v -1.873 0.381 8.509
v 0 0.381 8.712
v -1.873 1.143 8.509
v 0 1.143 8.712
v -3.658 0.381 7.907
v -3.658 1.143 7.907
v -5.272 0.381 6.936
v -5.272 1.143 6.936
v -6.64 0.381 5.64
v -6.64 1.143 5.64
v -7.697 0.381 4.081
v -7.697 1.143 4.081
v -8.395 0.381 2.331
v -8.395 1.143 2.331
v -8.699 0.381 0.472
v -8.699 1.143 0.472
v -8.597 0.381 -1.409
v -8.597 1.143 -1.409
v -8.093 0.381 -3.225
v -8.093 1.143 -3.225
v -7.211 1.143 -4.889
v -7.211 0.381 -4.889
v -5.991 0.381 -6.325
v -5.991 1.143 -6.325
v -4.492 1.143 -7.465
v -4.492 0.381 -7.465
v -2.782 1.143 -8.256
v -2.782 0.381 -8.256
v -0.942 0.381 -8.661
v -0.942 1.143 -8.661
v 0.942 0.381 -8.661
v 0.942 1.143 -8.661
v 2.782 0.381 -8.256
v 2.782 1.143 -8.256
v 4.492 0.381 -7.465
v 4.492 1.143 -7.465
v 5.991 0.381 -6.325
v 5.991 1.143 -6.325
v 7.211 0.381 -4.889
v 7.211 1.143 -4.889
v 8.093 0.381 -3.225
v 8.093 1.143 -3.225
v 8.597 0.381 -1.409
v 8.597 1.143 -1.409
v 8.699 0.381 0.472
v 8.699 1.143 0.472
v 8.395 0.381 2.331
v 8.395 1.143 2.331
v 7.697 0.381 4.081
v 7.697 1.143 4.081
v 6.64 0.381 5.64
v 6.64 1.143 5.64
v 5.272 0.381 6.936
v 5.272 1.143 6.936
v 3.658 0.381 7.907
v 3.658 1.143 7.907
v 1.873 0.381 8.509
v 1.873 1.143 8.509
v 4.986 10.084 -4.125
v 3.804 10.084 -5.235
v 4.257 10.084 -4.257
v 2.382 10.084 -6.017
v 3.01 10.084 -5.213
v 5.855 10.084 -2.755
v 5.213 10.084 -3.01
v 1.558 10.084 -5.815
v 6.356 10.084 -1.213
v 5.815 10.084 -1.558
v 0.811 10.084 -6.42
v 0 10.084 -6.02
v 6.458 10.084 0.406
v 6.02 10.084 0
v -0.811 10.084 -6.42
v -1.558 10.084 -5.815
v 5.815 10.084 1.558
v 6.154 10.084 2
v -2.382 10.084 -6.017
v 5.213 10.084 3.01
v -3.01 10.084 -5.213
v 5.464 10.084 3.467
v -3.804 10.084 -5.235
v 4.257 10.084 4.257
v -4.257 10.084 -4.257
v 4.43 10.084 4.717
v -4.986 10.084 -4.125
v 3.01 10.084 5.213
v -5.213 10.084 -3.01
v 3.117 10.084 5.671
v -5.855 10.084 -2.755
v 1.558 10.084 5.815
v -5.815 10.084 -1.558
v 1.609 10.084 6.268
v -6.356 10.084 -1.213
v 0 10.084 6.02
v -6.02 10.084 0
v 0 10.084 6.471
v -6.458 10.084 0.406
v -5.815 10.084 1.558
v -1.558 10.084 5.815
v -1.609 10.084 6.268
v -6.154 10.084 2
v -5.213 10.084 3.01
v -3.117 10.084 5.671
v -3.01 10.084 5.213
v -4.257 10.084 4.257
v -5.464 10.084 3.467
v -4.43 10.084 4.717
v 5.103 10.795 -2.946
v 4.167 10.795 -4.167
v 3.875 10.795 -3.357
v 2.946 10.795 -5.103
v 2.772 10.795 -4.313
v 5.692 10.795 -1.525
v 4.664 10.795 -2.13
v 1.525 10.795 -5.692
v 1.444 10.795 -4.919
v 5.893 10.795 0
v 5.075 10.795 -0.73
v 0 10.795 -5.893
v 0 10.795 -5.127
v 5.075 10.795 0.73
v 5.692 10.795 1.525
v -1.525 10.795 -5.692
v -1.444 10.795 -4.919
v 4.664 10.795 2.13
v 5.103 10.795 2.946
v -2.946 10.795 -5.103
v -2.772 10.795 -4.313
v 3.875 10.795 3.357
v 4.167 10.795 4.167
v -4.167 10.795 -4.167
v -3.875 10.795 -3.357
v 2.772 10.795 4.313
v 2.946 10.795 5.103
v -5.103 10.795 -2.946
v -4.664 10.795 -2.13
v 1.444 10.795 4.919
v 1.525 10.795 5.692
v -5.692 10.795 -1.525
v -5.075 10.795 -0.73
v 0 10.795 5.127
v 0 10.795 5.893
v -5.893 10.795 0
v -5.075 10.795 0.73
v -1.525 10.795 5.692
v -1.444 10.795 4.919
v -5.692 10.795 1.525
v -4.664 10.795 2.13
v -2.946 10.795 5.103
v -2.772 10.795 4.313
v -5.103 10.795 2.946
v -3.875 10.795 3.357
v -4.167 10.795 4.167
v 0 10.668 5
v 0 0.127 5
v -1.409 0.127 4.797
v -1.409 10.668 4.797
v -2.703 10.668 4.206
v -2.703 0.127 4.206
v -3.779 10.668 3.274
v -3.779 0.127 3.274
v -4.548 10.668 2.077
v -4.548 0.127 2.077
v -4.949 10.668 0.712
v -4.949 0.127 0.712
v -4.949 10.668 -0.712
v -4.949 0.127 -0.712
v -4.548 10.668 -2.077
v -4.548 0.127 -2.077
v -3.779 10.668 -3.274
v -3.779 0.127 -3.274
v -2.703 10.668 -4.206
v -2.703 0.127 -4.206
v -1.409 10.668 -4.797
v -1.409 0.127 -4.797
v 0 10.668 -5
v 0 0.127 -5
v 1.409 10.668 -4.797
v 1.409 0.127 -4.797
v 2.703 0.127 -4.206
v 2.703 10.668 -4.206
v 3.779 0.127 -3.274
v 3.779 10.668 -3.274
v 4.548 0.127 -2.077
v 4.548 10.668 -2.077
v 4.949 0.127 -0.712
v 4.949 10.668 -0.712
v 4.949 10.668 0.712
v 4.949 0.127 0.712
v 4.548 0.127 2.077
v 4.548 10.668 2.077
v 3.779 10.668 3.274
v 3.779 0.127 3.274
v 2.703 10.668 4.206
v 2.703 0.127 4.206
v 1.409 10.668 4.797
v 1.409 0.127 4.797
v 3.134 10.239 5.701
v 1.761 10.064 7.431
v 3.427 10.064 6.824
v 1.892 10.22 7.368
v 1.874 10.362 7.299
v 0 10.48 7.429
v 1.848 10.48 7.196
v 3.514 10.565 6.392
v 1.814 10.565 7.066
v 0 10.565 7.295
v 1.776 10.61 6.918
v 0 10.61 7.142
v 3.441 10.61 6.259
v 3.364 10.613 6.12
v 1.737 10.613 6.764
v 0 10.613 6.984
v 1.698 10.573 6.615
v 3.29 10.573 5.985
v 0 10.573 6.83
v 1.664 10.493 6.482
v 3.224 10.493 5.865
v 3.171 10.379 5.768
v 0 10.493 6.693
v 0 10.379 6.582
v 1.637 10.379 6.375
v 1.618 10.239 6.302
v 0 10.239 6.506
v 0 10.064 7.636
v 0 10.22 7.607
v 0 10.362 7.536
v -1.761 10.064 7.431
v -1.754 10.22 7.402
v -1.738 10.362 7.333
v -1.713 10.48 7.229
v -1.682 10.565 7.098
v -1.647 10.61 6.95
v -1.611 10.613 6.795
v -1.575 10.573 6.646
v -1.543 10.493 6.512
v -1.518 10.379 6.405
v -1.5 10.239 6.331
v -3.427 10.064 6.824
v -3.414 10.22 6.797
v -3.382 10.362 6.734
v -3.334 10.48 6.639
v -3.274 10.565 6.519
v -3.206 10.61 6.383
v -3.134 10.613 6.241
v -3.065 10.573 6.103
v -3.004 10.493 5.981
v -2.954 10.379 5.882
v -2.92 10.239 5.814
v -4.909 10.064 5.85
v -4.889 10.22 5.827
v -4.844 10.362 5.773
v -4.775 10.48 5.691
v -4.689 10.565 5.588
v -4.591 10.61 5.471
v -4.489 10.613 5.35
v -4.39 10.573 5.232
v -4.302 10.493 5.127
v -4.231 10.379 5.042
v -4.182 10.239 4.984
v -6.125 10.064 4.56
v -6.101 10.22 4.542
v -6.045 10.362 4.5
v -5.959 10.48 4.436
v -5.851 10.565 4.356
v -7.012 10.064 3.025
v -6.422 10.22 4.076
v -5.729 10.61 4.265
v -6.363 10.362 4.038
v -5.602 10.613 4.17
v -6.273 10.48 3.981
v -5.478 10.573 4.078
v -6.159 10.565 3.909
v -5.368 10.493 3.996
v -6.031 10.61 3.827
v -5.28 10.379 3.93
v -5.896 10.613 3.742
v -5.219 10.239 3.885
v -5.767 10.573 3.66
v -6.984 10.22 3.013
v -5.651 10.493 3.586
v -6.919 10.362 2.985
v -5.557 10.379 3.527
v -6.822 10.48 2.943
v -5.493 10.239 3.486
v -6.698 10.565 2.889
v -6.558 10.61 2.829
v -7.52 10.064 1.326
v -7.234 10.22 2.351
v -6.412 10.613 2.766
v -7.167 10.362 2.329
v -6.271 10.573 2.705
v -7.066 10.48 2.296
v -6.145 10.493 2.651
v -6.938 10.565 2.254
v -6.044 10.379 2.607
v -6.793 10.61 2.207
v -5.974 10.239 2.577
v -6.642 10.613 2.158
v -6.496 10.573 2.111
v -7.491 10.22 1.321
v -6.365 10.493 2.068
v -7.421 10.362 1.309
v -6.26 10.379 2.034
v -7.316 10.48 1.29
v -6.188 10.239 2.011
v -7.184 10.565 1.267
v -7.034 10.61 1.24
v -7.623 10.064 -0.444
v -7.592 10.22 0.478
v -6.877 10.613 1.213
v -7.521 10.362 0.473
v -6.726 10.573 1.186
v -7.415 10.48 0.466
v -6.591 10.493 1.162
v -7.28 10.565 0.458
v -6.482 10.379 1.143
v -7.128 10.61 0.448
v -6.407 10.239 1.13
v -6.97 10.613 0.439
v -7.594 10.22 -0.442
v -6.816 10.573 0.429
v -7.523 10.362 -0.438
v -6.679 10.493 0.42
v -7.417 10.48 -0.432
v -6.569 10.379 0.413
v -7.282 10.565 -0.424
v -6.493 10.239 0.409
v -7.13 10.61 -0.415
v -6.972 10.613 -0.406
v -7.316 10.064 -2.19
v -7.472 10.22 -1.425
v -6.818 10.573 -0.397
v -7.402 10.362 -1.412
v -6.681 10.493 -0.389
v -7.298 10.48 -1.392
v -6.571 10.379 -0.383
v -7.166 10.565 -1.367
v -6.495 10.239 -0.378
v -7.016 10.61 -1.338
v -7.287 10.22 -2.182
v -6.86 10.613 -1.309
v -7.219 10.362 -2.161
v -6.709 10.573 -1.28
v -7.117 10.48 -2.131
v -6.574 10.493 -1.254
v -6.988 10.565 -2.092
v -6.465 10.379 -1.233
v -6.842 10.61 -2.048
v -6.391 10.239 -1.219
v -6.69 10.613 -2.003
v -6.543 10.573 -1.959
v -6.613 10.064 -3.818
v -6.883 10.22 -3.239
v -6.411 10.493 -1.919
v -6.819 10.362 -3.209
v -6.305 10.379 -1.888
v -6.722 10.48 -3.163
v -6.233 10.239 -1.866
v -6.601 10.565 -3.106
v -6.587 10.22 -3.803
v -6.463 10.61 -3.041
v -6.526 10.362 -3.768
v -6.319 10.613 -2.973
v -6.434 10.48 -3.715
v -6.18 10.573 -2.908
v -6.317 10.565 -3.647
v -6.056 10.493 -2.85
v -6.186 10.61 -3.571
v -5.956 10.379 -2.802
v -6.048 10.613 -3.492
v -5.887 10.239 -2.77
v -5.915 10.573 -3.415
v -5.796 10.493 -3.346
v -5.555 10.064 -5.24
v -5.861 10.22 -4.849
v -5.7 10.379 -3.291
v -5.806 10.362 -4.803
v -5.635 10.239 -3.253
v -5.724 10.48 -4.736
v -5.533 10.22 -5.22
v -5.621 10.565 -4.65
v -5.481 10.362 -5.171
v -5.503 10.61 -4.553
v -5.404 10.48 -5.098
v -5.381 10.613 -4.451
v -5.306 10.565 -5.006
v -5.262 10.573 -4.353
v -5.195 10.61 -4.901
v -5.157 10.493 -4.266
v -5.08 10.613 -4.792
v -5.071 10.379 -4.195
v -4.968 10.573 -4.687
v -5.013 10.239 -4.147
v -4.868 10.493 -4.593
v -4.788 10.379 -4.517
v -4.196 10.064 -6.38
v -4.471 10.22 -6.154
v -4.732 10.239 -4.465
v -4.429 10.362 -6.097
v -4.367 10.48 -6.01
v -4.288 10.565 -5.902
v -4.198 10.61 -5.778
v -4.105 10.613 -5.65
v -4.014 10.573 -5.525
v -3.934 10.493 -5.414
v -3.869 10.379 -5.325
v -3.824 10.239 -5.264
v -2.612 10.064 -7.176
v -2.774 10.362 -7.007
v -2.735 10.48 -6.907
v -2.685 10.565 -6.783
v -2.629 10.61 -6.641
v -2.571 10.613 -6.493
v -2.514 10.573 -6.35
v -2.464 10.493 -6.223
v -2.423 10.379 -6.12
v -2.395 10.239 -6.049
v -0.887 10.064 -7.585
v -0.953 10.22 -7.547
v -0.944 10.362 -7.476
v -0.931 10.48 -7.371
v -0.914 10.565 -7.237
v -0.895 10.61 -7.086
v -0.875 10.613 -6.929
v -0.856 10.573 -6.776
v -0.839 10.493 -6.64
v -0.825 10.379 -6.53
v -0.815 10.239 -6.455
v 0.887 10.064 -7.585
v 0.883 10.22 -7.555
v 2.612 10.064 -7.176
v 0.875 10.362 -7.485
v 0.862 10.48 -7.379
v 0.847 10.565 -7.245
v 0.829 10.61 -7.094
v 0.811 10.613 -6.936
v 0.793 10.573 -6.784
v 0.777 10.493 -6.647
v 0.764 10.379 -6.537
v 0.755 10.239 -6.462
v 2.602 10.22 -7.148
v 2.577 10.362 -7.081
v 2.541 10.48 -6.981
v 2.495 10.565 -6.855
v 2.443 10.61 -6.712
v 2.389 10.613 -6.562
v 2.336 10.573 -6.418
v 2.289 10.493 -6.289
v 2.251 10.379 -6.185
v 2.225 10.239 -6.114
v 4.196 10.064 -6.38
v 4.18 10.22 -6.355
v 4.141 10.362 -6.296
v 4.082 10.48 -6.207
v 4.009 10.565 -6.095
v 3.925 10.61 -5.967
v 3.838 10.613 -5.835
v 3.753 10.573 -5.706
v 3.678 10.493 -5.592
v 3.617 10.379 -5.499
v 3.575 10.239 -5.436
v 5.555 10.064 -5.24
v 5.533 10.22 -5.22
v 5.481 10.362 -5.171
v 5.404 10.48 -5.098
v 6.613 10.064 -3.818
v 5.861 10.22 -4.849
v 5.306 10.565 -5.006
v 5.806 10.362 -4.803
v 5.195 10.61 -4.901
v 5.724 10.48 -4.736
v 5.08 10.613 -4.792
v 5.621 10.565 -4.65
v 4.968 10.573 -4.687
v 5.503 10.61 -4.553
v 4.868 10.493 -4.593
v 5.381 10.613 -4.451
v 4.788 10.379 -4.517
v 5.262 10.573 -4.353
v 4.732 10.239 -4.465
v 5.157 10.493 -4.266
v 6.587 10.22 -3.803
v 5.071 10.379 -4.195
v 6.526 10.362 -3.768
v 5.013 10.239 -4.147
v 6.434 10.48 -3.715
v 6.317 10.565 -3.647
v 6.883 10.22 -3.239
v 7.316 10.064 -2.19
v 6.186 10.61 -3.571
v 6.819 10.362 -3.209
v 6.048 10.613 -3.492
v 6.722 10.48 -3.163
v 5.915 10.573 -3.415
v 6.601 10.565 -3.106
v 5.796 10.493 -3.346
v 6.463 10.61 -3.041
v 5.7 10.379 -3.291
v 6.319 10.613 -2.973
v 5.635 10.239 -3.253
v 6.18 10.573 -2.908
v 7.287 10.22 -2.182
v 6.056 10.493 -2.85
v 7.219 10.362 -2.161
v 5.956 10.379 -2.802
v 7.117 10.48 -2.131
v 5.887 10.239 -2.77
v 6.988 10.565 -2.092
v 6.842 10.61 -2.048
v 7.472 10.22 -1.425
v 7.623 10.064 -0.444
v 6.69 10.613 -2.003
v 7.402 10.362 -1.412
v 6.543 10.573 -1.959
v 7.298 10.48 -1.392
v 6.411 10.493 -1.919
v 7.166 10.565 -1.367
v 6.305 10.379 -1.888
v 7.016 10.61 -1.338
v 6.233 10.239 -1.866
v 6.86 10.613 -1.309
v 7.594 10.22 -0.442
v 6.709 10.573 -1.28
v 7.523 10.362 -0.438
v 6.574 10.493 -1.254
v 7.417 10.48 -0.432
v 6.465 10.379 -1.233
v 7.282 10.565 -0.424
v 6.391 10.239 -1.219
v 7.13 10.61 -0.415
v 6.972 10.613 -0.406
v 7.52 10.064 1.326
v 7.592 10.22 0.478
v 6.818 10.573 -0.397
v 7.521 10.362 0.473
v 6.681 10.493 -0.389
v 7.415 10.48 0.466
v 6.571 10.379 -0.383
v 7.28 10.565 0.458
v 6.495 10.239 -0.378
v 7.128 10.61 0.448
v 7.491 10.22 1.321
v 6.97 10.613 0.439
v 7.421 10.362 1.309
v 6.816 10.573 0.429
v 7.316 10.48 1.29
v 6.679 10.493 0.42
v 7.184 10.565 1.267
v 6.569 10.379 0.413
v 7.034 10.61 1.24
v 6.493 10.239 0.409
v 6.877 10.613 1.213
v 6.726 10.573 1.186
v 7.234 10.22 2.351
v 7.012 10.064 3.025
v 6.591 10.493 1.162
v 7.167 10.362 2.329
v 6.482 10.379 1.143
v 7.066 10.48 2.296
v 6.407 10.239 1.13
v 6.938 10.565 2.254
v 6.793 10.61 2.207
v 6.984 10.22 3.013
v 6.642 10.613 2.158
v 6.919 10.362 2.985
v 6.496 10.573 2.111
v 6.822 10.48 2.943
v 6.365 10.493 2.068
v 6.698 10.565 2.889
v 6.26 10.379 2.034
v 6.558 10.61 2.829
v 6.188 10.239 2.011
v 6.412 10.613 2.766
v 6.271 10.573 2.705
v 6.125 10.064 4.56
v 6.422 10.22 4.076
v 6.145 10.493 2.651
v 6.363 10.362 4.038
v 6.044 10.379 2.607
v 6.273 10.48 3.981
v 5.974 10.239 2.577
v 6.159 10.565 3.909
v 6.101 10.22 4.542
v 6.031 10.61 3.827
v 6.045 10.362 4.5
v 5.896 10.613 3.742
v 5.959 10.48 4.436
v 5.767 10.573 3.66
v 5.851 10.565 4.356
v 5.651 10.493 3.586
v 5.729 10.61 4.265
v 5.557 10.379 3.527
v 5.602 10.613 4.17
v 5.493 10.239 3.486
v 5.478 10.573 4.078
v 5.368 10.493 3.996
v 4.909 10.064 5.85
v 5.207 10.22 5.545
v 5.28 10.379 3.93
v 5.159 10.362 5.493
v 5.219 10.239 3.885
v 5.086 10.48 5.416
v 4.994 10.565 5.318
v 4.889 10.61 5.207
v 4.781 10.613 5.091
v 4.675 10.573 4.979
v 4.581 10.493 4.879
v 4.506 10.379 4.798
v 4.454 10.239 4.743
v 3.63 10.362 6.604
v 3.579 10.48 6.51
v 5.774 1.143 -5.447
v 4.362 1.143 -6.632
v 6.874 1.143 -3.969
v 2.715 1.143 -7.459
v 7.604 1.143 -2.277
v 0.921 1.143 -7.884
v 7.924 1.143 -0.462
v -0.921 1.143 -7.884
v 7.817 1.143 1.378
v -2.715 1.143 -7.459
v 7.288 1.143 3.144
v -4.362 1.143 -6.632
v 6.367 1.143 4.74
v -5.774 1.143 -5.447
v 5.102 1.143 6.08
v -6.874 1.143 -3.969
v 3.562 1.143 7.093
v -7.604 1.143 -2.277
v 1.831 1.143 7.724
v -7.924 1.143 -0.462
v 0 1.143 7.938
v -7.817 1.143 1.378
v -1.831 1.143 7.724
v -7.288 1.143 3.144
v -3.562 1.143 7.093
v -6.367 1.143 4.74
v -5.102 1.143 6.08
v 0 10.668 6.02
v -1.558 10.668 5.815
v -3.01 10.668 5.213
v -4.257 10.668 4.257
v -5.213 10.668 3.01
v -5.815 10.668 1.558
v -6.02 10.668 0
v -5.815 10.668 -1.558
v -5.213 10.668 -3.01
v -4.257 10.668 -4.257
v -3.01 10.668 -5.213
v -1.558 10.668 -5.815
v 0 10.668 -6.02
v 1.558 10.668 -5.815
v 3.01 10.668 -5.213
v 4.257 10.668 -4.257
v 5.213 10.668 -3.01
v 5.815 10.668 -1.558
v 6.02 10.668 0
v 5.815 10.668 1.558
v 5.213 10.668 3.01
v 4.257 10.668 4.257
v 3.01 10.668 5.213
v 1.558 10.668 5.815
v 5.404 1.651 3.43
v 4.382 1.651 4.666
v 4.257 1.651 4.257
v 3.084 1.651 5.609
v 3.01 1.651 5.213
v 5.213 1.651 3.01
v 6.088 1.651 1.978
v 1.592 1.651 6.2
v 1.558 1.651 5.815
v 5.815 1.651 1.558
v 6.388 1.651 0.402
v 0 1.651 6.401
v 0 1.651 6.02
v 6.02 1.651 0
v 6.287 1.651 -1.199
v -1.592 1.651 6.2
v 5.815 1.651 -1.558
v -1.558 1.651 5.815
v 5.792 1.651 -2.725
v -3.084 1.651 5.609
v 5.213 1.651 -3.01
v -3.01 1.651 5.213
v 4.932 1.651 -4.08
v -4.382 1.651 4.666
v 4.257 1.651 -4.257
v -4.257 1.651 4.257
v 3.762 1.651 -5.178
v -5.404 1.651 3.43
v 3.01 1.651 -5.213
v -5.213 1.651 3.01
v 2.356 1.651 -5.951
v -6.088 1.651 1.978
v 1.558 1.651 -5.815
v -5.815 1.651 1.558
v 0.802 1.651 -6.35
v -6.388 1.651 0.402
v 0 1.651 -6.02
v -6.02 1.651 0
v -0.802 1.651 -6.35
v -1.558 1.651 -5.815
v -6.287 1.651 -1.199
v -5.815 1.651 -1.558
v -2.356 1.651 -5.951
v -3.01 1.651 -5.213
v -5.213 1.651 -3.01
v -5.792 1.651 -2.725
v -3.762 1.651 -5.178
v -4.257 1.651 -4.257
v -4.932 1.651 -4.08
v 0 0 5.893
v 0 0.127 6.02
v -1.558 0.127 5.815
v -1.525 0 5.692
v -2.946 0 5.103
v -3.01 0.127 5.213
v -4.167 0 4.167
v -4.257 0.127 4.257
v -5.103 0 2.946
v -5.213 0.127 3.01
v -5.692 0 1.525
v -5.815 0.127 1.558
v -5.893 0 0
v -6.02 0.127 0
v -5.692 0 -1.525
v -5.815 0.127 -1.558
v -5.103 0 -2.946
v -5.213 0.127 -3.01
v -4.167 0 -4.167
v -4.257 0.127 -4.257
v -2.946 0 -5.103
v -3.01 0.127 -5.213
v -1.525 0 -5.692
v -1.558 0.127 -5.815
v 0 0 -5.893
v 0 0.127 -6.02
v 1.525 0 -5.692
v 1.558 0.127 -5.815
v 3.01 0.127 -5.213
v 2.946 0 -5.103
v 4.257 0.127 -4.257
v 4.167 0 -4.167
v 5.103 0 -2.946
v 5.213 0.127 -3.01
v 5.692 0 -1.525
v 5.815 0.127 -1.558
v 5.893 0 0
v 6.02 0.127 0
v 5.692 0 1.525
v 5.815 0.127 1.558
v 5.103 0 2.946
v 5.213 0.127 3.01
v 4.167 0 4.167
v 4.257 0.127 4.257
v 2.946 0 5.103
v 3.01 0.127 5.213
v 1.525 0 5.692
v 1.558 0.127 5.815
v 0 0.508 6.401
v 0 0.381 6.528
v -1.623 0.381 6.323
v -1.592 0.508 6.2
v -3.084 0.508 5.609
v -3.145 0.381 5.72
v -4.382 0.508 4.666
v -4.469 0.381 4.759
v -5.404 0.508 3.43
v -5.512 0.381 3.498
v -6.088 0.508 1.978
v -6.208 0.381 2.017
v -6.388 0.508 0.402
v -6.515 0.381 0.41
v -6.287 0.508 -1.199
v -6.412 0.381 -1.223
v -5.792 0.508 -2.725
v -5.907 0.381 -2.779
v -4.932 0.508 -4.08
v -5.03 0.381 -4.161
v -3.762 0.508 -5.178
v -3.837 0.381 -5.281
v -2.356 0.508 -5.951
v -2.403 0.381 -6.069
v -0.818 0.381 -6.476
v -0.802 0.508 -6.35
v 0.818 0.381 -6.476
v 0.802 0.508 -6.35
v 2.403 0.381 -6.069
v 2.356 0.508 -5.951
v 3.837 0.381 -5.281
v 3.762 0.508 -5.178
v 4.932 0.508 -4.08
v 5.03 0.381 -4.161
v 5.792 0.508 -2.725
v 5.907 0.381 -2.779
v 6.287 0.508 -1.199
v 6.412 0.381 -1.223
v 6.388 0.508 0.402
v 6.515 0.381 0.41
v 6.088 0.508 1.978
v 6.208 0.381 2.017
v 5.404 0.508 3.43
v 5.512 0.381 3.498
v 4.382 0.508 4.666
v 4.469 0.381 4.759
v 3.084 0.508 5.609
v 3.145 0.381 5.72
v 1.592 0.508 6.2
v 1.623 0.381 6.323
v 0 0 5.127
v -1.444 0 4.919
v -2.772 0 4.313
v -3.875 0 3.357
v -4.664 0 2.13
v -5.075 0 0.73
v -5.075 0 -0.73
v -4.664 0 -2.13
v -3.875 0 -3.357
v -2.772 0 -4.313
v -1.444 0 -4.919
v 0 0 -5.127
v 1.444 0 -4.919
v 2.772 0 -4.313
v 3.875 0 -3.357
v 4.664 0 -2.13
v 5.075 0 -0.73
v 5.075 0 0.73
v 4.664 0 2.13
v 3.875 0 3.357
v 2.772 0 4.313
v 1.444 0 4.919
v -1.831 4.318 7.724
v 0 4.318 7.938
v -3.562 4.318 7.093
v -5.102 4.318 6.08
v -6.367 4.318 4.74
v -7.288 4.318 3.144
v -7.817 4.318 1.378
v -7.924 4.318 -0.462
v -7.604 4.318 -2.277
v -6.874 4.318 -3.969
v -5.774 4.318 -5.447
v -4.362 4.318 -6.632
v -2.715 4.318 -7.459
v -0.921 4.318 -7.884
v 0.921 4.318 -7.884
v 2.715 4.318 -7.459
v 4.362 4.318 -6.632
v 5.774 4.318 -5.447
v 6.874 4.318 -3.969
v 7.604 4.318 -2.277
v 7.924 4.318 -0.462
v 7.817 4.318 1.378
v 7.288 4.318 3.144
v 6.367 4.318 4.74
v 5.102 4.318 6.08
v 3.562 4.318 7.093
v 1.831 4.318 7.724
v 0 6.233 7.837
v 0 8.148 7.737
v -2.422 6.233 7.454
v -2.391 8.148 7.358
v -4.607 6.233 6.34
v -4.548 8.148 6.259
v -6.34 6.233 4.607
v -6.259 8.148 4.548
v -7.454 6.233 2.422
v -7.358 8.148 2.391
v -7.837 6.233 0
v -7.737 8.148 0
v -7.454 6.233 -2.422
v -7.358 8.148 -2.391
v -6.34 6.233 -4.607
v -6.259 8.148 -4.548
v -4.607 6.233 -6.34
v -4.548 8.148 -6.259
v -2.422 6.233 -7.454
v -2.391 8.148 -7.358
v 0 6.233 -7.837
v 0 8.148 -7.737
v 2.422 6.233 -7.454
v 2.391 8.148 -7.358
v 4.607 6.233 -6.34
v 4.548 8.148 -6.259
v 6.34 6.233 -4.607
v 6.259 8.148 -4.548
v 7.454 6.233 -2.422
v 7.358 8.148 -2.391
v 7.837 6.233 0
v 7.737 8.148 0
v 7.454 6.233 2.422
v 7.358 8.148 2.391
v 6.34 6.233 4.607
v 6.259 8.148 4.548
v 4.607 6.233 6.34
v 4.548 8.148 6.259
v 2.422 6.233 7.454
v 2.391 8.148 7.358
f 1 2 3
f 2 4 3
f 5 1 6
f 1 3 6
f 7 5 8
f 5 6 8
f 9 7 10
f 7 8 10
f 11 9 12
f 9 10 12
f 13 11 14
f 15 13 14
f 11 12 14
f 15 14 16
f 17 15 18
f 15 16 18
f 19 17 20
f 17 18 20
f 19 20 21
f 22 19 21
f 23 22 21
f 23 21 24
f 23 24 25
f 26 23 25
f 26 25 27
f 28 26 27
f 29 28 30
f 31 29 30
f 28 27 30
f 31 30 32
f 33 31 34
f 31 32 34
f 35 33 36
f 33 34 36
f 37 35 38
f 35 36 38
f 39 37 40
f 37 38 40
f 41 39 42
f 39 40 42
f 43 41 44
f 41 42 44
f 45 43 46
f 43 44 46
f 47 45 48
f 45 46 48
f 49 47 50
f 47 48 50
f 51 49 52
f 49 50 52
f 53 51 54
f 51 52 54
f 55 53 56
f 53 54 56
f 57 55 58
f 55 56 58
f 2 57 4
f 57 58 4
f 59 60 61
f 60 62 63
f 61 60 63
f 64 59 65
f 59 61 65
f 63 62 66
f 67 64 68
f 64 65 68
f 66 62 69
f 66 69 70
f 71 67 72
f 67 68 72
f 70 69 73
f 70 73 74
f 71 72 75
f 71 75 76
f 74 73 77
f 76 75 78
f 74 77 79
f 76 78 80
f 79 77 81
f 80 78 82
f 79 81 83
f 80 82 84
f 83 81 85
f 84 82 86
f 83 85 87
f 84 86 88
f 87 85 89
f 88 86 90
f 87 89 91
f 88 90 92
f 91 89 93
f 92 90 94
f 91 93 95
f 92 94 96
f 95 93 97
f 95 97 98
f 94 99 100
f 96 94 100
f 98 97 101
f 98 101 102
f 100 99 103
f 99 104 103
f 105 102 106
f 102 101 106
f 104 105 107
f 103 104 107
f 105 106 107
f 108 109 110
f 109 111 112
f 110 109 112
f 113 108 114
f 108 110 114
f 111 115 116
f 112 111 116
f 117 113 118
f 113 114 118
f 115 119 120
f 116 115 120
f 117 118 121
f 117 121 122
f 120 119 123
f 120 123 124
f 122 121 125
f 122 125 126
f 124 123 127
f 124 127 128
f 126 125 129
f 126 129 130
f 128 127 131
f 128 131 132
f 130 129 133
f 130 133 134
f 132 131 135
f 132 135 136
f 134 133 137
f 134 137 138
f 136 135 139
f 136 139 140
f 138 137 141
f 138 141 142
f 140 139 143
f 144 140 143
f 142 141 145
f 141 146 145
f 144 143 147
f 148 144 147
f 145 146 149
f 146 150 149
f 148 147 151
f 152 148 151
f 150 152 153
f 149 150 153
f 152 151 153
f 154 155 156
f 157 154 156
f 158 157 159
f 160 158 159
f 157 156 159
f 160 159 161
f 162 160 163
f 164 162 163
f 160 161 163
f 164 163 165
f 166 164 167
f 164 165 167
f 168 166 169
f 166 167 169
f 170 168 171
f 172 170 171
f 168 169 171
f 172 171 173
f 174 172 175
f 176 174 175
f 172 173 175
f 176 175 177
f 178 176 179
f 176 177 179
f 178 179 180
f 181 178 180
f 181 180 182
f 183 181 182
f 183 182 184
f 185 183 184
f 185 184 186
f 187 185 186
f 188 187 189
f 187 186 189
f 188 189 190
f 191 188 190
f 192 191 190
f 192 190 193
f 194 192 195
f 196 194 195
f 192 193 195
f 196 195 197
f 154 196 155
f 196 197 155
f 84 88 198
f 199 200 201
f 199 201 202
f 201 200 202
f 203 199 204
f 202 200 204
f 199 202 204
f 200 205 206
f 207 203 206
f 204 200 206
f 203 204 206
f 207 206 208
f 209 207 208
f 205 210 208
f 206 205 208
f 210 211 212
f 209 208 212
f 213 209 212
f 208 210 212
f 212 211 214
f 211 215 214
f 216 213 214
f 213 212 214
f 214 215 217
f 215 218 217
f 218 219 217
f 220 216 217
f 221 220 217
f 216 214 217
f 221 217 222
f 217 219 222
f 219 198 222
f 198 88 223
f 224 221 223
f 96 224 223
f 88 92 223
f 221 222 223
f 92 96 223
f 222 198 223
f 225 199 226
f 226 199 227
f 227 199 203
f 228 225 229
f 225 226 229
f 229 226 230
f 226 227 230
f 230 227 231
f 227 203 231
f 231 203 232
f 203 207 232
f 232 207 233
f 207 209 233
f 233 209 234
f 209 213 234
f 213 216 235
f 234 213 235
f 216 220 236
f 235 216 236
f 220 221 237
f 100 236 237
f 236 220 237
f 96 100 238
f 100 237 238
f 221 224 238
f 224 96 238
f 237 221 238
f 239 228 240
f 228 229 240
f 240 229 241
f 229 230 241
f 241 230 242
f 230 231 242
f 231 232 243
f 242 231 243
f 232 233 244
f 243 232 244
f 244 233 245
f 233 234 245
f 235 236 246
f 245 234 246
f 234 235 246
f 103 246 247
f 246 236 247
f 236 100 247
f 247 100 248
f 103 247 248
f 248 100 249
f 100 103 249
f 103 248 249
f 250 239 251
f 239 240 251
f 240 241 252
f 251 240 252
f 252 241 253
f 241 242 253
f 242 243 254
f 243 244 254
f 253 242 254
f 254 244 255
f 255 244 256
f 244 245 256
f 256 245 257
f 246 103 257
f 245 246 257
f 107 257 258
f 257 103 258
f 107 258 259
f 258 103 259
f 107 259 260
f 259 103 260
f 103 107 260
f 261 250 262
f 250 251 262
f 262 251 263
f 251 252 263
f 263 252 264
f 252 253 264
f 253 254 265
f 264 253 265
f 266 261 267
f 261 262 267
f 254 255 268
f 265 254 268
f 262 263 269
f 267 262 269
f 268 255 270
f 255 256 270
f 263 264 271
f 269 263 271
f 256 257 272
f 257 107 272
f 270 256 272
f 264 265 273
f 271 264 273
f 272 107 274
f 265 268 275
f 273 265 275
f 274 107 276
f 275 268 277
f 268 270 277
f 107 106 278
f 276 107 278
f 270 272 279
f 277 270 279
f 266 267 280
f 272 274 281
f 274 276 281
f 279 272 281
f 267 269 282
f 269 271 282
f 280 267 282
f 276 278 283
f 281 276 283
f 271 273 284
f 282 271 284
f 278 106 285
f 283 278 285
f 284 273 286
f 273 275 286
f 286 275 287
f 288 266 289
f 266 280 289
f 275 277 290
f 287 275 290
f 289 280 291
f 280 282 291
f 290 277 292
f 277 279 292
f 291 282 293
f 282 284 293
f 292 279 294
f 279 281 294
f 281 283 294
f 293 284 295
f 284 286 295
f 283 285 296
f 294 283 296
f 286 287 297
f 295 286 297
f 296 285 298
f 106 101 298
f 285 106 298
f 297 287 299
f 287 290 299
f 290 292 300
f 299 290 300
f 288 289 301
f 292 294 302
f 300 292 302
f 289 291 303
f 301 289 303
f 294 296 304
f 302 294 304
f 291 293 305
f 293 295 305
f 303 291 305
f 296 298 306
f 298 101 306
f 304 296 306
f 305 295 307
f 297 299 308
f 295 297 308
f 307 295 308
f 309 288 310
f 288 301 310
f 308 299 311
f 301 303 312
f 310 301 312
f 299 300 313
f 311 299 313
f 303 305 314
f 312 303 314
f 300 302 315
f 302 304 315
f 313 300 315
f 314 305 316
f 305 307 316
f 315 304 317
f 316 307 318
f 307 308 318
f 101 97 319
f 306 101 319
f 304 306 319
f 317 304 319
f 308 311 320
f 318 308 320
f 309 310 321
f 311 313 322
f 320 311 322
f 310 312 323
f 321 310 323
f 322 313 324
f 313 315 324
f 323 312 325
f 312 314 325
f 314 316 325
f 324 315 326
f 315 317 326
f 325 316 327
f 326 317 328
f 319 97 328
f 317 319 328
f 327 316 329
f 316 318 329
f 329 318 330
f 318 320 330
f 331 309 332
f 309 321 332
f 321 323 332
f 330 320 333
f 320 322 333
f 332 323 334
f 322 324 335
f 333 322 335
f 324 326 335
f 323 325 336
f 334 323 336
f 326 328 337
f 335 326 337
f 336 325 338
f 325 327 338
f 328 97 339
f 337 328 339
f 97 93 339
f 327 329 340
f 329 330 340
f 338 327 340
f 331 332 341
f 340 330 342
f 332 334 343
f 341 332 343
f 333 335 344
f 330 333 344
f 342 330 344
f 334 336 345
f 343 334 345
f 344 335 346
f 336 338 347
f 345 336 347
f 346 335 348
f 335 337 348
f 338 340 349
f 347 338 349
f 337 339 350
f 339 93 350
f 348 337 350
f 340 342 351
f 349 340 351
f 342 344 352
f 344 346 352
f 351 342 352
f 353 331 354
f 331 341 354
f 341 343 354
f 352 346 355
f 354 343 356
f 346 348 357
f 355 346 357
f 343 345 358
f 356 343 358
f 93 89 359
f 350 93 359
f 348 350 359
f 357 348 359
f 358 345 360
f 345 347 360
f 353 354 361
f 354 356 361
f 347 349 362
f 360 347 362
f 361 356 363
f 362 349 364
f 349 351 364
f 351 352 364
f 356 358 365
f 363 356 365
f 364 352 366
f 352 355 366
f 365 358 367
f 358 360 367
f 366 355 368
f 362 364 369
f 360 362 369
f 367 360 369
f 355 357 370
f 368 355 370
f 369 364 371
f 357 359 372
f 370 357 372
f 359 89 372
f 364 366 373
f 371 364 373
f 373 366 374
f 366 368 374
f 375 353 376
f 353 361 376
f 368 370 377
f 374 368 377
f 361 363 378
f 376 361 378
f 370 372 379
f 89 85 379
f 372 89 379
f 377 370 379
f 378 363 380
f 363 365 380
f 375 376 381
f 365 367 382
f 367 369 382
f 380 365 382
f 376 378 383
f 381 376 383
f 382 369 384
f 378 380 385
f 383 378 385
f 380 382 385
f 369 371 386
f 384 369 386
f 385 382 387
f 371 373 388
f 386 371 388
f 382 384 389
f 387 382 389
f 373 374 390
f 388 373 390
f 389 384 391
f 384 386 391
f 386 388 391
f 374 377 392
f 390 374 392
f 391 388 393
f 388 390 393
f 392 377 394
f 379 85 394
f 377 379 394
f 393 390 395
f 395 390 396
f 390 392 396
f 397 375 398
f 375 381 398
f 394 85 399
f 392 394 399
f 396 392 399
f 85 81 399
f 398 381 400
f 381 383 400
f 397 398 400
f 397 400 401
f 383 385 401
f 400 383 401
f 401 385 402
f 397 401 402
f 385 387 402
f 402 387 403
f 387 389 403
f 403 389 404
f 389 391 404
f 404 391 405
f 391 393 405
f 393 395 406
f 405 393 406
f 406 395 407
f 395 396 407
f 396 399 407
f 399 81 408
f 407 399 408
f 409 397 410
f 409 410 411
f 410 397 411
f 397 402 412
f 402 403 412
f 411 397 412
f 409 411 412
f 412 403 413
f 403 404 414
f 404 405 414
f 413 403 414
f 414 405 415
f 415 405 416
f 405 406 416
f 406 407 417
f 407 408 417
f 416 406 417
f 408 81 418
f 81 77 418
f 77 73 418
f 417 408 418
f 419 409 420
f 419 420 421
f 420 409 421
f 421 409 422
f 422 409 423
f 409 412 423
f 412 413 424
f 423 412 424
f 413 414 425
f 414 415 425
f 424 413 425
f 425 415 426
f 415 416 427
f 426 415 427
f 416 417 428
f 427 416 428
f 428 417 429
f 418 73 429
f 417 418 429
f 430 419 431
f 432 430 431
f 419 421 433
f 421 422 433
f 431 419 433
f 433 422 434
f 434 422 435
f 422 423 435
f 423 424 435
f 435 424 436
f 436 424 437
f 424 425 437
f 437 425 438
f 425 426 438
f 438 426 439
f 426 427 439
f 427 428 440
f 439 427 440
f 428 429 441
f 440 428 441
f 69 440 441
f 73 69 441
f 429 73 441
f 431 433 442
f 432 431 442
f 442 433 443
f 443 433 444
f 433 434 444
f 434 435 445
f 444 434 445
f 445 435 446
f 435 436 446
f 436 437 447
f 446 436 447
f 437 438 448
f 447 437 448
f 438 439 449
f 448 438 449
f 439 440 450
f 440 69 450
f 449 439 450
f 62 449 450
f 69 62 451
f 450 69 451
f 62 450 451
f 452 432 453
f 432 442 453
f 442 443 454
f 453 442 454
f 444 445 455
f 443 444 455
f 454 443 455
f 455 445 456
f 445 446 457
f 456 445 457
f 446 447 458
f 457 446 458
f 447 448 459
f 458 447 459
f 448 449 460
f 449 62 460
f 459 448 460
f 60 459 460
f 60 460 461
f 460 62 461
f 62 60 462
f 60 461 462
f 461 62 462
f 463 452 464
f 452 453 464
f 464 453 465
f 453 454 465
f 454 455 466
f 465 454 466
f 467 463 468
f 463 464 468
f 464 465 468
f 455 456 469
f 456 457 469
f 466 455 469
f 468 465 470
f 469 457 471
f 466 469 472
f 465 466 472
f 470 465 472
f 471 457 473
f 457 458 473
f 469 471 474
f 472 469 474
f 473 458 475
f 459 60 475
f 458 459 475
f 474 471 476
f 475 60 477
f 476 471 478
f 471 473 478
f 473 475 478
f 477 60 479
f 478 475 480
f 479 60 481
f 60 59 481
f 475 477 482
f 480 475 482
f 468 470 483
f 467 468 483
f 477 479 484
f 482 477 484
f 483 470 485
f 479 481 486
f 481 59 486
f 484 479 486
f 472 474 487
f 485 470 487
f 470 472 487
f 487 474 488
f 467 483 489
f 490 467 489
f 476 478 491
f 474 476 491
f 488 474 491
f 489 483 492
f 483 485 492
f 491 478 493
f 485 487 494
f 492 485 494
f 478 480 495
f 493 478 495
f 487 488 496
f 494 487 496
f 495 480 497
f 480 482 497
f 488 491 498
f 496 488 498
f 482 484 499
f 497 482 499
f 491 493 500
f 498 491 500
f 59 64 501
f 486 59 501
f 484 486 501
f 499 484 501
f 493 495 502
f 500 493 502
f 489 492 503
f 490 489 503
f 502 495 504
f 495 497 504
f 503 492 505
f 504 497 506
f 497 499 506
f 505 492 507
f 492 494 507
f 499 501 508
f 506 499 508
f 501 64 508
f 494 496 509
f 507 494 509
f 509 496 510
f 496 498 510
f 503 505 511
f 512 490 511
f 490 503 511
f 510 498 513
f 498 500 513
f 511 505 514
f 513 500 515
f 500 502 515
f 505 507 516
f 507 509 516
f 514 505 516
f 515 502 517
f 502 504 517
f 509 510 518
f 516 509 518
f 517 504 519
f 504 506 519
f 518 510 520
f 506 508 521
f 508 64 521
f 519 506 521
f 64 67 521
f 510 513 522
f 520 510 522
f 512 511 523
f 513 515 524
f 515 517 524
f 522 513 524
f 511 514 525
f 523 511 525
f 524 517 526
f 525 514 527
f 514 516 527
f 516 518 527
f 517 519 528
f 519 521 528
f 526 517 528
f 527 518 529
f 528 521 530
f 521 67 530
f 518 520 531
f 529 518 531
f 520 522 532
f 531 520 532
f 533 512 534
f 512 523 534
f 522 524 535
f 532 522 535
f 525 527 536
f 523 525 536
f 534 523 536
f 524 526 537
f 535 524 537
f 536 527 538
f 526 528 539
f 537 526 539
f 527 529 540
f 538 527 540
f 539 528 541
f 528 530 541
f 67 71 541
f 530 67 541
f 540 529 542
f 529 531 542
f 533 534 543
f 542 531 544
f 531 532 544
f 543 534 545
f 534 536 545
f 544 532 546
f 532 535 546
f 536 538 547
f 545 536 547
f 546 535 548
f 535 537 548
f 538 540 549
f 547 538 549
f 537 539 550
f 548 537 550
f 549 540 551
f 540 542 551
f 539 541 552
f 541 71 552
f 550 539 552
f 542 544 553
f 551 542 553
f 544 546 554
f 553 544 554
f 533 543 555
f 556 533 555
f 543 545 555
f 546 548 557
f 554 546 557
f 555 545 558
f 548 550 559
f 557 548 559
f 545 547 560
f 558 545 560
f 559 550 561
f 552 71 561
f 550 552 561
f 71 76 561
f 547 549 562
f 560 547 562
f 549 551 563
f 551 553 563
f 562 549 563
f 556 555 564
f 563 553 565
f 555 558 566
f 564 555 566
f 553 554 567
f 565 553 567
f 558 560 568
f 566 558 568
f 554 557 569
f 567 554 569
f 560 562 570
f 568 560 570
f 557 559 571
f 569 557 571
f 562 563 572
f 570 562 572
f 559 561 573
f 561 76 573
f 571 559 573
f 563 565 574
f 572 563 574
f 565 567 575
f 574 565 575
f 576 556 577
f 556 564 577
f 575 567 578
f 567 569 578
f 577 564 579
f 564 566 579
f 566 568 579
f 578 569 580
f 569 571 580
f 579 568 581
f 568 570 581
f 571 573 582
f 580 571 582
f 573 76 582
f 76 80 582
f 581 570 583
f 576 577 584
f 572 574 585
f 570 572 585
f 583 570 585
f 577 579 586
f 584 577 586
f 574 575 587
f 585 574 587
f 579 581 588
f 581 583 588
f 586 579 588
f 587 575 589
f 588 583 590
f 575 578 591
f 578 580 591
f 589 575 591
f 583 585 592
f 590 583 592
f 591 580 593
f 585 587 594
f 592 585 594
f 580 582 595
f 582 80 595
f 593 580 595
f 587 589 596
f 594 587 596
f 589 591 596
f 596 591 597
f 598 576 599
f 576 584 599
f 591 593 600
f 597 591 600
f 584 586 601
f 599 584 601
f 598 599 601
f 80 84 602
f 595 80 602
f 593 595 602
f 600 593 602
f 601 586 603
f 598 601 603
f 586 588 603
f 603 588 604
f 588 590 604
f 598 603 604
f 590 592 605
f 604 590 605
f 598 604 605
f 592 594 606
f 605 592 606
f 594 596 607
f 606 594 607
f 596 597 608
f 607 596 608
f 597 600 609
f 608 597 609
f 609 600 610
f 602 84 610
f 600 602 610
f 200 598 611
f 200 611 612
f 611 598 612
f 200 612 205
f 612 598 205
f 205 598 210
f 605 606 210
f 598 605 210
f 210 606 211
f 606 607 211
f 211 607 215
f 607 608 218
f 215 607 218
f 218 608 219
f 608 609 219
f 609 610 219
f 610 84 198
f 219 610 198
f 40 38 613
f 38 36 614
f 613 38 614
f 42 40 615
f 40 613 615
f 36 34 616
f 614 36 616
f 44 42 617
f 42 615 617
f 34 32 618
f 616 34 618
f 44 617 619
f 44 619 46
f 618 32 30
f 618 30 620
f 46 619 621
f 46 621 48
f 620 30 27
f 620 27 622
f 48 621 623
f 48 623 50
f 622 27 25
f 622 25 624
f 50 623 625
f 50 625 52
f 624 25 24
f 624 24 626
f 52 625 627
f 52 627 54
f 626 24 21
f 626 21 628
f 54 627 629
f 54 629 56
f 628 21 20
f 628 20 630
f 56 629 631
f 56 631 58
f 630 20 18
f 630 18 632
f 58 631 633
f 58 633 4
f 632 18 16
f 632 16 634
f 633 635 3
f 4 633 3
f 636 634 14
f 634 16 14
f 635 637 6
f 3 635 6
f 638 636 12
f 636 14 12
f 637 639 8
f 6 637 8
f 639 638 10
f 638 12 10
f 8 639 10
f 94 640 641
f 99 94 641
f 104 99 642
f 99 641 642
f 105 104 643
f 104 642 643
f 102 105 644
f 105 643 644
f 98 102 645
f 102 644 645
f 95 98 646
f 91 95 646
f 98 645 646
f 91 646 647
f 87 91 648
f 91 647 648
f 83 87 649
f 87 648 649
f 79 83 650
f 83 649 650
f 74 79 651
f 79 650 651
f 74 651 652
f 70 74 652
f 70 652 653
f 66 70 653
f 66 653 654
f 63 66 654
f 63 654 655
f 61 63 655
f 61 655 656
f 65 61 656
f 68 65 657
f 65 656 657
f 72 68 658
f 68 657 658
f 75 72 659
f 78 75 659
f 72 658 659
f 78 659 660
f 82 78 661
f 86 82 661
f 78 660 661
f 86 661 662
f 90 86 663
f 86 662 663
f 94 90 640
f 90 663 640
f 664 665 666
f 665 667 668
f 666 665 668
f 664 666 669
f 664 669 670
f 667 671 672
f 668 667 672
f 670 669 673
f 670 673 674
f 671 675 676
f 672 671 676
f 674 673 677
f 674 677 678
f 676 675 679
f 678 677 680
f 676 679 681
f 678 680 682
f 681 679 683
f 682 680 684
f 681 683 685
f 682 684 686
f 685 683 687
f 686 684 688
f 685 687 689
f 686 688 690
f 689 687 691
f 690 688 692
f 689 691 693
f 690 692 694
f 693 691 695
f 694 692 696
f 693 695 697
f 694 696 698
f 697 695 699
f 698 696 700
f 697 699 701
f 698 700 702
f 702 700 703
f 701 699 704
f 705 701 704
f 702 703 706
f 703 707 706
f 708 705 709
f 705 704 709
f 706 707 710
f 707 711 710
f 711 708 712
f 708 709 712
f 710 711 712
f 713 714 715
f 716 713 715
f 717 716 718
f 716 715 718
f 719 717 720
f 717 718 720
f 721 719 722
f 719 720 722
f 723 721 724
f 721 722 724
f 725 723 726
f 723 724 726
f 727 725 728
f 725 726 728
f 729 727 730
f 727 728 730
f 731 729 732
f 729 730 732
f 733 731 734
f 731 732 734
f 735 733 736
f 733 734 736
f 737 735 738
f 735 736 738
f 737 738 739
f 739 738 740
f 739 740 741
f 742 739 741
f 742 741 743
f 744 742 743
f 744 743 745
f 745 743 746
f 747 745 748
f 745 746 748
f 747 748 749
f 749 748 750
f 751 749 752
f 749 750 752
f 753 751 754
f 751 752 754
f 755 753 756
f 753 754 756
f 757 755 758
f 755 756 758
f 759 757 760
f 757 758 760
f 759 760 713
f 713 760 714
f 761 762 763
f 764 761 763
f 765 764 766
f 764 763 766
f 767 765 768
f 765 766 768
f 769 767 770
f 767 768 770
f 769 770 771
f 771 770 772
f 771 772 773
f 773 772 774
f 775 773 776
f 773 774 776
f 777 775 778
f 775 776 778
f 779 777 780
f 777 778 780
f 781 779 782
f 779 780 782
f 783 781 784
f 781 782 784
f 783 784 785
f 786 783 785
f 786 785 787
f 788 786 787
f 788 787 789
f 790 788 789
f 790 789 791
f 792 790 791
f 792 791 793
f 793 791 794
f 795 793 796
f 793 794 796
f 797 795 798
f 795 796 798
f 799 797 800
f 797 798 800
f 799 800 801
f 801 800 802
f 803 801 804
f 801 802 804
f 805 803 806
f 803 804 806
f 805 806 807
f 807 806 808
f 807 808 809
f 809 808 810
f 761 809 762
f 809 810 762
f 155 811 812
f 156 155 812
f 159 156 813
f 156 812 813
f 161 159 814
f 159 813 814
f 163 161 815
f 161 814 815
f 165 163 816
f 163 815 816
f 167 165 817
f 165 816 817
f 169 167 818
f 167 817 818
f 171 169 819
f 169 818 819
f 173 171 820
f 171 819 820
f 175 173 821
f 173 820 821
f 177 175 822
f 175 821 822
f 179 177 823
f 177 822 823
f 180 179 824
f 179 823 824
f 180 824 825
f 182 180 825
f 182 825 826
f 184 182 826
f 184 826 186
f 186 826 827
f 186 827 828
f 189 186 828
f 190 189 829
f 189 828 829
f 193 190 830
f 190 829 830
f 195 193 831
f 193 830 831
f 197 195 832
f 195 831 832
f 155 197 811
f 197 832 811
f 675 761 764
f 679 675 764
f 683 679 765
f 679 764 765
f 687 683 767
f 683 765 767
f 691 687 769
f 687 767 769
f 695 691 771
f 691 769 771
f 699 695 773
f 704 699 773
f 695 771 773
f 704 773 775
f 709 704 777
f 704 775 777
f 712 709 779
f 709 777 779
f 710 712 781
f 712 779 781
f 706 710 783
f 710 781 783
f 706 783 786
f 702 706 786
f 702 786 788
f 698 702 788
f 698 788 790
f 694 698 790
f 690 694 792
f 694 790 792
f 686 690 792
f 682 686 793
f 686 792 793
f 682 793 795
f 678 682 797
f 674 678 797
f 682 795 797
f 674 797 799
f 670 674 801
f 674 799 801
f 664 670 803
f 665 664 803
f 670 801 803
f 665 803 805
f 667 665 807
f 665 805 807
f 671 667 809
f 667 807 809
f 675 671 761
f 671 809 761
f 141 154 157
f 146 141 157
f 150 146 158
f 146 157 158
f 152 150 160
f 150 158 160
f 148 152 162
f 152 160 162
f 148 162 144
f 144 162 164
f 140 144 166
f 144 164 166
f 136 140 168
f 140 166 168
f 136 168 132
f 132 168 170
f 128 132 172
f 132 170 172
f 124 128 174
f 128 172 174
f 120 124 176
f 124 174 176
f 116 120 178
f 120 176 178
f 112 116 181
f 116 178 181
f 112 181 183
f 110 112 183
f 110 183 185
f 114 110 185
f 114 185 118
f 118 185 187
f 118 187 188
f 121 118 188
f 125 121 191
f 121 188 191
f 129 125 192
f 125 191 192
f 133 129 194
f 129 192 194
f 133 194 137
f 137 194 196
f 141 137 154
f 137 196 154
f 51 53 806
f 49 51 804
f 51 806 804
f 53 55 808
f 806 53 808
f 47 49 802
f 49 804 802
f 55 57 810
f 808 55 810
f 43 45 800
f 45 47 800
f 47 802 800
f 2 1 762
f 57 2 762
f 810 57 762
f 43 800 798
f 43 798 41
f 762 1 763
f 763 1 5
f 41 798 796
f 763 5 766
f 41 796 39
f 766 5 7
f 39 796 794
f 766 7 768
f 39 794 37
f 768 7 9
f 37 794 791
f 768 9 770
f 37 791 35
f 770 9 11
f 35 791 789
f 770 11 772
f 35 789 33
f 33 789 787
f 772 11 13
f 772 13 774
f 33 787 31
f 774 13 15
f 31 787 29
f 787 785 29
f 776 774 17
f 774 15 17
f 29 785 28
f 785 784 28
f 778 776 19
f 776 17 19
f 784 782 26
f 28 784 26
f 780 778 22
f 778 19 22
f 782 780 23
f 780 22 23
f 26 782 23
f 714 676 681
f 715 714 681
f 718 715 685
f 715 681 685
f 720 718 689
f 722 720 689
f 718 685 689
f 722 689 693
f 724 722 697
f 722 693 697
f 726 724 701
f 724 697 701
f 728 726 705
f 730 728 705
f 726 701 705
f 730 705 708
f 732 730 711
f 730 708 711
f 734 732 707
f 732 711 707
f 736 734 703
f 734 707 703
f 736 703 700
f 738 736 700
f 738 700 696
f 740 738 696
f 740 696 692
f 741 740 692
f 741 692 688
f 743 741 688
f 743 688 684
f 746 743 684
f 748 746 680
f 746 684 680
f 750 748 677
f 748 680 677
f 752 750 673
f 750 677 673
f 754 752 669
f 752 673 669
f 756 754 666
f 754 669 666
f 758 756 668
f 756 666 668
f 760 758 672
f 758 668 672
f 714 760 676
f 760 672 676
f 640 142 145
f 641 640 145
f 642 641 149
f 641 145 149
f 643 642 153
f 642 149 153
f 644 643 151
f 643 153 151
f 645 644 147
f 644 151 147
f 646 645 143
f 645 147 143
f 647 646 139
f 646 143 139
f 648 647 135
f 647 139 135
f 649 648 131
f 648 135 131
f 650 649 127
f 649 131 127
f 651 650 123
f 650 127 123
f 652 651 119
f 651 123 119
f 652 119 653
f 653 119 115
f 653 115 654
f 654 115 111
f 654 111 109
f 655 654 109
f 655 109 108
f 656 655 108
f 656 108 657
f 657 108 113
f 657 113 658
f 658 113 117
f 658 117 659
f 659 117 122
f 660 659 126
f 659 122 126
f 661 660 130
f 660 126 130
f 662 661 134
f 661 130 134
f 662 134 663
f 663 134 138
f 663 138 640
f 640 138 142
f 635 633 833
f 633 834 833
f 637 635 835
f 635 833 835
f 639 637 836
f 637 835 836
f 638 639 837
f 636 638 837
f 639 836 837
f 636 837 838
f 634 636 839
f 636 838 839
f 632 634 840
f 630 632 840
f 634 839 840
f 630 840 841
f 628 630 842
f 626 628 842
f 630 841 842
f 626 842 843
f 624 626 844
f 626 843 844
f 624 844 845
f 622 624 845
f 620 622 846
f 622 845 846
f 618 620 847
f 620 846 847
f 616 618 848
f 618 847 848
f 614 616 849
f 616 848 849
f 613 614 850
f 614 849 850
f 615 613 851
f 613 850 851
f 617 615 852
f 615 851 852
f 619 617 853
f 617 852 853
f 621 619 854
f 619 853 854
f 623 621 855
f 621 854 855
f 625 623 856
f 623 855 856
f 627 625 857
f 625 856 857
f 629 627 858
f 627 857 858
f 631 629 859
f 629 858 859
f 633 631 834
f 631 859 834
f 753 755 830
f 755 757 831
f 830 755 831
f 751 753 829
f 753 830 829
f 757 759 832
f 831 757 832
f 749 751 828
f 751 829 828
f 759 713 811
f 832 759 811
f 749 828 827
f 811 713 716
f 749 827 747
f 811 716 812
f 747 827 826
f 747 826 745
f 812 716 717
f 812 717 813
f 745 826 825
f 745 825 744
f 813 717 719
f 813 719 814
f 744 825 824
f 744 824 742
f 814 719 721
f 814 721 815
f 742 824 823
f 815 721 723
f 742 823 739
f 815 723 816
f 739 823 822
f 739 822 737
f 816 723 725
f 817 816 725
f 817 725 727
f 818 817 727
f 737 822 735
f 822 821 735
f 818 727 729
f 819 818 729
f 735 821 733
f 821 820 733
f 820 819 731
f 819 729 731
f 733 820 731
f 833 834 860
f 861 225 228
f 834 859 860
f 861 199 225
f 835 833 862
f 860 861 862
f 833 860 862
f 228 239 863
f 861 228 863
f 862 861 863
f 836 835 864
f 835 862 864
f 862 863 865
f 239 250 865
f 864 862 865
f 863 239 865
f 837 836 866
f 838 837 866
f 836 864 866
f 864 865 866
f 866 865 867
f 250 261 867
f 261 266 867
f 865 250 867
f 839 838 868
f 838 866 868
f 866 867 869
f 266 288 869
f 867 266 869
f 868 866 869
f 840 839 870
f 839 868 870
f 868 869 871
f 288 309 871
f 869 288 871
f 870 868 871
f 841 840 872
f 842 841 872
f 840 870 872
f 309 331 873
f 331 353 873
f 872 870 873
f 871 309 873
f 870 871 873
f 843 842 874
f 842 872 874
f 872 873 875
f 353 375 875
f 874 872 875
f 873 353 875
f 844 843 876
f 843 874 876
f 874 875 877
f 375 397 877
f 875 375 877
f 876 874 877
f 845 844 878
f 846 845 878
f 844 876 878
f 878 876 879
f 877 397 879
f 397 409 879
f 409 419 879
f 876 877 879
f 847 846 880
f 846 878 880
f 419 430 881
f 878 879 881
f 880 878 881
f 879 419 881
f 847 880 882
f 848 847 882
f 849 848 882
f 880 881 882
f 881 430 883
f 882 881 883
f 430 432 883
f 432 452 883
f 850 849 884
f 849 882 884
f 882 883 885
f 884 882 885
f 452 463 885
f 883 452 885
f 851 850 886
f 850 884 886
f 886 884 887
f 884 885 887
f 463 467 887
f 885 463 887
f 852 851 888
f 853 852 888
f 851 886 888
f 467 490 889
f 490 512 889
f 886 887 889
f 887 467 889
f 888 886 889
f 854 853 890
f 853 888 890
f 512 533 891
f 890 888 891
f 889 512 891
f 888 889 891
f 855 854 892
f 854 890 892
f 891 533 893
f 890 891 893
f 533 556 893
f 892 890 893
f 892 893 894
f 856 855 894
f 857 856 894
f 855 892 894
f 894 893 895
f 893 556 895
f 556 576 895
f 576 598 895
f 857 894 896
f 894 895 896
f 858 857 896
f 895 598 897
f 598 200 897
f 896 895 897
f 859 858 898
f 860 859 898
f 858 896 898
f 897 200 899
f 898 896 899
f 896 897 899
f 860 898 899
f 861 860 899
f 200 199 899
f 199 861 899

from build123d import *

# Parameters (mm, degrees)
CHAMFER1_SIZE = 0.127


with BuildPart() as part:
    # Sketch1 → Revolve1 (revolve)
    with BuildSketch(Plane.XY, mode=Mode.PRIVATE) as revolve1_sk:
        with BuildLine():
            Line((-8.7122, 0.381), (-8.7122, 1.143))
            Line((-8.7122, 1.143), (-7.9375, 1.143))
            Line((-7.9375, 1.143), (-7.9375, 4.318))
            Line((-7.9375, 4.318), (-7.636387191, 10.063574666))
            ThreePointArc((-7.636387191, 10.063574666), (-7.063125107, 10.61711204), (-6.471000704, 10.0838))
            Line((-6.471000704, 10.0838), (-6.0198, 10.0838))
            Line((-6.0198, 10.0838), (-6.0198, 10.795))
            Line((-6.0198, 10.795), (-5, 10.795))
            Line((-5, 10.795), (-5, 0))
            Line((-5, 0), (-6.0198, 0))
            Line((-6.0198, 0), (-6.0198, 1.651))
            Line((-6.0198, 1.651), (-6.4008, 1.651))
            Line((-6.4008, 1.651), (-6.4008, 0.381))
            Line((-6.4008, 0.381), (-8.7122, 0.381))
        make_face()
    revolve(revolve1_sk.sketch.rotate(Axis((0, 15.281488856, 0), (0, -1, 0)), 270), axis=Axis((0, 15.281488856, 0), (0, -1, 0)))

    # Chamfer1
    chamfer1_edges = [part.edges().sort_by_distance(p)[0] for p in [
        (0, 0, -6.0198),
        (0, 0, -5),
        (0, 10.795, -5),
        (0, 10.795, -6.0198),
        (0, 0.381, -6.4008),
    ]]
    chamfer(chamfer1_edges, length=CHAMFER1_SIZE)


solid = part.part
